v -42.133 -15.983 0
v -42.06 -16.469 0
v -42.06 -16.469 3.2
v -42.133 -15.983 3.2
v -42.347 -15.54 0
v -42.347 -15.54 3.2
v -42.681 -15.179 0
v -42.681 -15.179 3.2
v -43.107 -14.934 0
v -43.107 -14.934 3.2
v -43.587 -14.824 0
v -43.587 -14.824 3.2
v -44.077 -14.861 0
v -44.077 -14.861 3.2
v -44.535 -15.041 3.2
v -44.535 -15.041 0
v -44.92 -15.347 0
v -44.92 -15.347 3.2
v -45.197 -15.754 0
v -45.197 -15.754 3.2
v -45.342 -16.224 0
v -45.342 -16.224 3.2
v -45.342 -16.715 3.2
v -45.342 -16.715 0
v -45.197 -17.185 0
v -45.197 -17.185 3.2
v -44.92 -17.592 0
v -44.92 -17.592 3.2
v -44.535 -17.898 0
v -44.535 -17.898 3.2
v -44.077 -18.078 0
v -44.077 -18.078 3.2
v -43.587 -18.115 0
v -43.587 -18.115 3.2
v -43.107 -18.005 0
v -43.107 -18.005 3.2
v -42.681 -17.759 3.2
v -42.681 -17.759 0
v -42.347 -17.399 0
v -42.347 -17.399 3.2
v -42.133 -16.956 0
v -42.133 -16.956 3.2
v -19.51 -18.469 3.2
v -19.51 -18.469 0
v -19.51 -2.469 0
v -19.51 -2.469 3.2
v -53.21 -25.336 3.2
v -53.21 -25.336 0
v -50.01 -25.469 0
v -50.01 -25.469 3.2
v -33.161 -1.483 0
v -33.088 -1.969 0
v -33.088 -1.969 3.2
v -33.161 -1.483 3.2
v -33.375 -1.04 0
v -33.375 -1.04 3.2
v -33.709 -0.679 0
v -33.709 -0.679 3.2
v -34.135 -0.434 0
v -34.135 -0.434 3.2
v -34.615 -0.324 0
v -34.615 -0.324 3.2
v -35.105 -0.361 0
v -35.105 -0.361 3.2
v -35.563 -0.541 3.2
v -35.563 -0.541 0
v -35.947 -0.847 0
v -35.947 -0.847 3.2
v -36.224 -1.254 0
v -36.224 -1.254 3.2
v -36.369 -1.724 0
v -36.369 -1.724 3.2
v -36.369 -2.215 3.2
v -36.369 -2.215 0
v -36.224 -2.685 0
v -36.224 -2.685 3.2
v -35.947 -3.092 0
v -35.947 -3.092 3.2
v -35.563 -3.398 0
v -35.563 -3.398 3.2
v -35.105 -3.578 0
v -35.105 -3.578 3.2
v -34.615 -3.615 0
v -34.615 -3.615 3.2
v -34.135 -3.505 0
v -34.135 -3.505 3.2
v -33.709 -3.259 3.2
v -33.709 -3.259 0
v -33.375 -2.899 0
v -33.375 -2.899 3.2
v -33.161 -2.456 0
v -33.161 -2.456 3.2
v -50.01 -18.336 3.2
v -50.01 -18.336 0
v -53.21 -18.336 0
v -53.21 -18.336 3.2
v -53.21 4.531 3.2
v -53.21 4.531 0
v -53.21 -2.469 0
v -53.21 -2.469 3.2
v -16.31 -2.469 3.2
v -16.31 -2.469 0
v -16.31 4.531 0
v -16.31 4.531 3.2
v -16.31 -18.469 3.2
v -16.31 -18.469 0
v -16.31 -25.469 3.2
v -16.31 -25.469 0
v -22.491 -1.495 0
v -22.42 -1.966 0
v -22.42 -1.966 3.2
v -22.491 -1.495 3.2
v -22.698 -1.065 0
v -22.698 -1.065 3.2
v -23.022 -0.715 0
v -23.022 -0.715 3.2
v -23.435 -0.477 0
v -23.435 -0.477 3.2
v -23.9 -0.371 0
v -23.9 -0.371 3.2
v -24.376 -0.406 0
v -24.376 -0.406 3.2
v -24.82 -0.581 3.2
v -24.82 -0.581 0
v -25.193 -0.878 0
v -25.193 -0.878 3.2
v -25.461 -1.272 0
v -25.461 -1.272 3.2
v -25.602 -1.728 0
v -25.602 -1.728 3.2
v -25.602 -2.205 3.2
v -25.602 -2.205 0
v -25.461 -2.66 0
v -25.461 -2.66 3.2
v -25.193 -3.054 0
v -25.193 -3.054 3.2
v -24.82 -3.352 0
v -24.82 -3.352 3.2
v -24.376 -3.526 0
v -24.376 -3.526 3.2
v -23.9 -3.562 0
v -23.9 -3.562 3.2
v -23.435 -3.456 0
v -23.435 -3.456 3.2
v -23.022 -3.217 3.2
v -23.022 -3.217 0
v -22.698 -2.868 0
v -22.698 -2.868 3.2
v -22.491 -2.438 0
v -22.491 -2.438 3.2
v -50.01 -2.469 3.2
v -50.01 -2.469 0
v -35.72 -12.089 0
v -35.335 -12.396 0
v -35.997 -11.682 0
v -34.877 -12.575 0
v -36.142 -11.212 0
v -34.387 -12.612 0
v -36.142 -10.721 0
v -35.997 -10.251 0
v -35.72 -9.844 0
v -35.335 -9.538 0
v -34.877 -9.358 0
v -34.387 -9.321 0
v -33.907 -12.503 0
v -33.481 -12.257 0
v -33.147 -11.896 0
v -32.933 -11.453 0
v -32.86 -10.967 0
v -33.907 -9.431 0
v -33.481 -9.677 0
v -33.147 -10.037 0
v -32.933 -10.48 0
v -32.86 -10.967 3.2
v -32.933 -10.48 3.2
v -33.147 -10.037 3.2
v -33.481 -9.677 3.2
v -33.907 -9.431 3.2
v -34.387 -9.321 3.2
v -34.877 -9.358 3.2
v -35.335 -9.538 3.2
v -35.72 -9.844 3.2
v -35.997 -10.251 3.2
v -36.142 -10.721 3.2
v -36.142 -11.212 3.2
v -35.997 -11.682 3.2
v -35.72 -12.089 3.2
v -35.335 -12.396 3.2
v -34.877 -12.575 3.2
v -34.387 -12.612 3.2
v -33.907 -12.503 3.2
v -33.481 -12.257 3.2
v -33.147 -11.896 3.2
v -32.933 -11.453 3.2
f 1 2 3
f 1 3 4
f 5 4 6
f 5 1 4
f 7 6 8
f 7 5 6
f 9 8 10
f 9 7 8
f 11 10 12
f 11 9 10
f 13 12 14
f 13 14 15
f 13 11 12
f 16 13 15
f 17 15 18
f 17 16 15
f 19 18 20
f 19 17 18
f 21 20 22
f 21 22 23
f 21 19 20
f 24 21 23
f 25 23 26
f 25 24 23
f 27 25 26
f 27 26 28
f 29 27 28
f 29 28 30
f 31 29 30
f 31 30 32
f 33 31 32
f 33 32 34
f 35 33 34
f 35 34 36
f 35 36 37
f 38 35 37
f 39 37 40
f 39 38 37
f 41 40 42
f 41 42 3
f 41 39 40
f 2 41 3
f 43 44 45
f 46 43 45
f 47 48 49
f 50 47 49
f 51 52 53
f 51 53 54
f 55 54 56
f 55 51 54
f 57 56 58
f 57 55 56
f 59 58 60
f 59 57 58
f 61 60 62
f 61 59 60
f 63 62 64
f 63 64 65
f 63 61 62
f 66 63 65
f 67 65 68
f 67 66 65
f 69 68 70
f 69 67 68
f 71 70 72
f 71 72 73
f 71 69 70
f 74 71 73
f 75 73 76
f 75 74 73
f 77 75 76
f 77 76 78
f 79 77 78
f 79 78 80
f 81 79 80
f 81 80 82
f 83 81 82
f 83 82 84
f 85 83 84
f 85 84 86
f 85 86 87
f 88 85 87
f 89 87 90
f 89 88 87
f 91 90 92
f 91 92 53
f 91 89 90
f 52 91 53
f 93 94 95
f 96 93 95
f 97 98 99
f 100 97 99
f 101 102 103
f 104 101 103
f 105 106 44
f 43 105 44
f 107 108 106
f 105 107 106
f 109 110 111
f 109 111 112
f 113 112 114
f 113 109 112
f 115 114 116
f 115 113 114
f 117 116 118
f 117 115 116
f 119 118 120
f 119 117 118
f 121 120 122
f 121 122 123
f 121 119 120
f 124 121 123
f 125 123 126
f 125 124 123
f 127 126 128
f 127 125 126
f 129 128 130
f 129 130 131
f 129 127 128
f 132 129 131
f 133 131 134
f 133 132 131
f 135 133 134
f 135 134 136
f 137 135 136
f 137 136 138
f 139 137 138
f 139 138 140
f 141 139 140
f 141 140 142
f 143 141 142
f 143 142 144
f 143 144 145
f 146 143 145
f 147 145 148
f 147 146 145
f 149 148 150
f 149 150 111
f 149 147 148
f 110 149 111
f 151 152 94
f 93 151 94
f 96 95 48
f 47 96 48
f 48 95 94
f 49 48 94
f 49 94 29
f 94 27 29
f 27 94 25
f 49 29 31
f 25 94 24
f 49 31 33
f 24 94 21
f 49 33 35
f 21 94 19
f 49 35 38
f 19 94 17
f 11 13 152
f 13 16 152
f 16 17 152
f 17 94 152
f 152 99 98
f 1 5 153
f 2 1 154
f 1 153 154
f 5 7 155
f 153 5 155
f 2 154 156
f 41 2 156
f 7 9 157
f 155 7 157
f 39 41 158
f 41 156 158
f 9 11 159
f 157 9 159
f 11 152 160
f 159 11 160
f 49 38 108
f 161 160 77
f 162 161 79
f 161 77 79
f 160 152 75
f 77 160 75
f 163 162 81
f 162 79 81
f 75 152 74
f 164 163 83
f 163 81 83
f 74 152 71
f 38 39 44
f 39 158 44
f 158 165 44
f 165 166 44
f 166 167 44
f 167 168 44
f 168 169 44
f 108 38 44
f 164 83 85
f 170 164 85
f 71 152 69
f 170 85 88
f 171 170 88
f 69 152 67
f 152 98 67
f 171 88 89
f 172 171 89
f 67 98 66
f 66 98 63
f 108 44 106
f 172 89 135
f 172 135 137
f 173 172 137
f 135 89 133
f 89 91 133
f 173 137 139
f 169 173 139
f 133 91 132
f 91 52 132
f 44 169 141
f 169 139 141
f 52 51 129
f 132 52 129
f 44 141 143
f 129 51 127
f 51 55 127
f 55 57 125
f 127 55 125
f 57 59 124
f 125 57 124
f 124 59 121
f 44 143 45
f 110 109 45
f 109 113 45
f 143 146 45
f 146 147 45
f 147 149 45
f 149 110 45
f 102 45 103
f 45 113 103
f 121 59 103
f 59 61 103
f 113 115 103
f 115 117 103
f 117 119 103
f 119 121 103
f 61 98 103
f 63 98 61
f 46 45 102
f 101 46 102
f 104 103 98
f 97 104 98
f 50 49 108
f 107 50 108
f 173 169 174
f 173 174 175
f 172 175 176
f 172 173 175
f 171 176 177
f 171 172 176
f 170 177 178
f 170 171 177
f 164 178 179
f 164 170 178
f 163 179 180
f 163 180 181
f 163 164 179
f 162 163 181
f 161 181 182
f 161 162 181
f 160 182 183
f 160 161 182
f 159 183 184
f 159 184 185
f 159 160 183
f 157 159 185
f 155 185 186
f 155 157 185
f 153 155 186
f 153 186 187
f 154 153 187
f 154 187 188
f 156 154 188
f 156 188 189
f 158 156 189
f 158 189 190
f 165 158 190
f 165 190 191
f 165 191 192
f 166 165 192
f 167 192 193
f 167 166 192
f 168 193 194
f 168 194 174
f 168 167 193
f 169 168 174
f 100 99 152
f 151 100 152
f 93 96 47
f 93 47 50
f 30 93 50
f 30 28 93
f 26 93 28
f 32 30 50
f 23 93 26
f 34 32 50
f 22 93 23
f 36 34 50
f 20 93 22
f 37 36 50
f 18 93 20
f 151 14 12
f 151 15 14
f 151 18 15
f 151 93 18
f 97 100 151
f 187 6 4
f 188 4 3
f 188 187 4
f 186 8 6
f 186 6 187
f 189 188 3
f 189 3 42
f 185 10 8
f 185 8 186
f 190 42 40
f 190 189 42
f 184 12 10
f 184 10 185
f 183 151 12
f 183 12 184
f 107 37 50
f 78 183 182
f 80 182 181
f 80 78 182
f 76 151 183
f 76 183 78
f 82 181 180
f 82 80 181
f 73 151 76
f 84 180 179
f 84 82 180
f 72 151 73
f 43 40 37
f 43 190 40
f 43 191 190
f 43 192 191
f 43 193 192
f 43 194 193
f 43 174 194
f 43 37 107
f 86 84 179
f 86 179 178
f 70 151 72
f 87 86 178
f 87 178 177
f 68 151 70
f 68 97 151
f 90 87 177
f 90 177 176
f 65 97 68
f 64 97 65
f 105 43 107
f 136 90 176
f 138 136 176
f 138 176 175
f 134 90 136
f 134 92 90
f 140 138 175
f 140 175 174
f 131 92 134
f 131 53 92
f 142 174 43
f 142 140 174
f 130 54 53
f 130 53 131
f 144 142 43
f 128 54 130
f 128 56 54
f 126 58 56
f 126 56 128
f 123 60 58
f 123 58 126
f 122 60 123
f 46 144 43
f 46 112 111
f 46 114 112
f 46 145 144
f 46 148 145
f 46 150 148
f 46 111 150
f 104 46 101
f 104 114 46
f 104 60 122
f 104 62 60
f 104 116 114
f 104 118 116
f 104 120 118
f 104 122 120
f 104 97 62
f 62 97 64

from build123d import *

# Parameters (mm, degrees)
F0_R     = 1.65
F0_R_2   = 1.6
F1_DEPTH = 3.2


with BuildPart() as f1:
    # F0 (on Top) → F1 (new body)
    with BuildSketch(Plane.XY):
        Polygon((-19.510088, 4.530542), (-50.010088, 4.530542), (-53.210088, 4.530542), (-53.210088, -2.469458), (-50.010088, -2.469458), (-50.010088, -18.335517), (-53.210088, -18.335517), (-53.210088, -25.335517), (-50.010088, -25.469458), (-19.510088, -25.469458), (-16.310088, -25.469458), (-16.310088, -18.469458), (-19.510088, -18.469458), (-19.510088, -2.469458), (-16.310088, -2.469458), (-16.310088, 4.530542), align=None)
        with Locations((-43.710088, -16.469458)):
            Circle(F0_R, mode=Mode.SUBTRACT)
        with Locations((-34.510088, -10.966575)):
            Circle(F0_R, mode=Mode.SUBTRACT)
        with Locations((-34.737864, -1.969458)):
            Circle(F0_R, mode=Mode.SUBTRACT)
        with Locations((-24.019817, -1.966214)):
            Circle(F0_R_2, mode=Mode.SUBTRACT)
    extrude(amount=F1_DEPTH)


solid = f1.part
